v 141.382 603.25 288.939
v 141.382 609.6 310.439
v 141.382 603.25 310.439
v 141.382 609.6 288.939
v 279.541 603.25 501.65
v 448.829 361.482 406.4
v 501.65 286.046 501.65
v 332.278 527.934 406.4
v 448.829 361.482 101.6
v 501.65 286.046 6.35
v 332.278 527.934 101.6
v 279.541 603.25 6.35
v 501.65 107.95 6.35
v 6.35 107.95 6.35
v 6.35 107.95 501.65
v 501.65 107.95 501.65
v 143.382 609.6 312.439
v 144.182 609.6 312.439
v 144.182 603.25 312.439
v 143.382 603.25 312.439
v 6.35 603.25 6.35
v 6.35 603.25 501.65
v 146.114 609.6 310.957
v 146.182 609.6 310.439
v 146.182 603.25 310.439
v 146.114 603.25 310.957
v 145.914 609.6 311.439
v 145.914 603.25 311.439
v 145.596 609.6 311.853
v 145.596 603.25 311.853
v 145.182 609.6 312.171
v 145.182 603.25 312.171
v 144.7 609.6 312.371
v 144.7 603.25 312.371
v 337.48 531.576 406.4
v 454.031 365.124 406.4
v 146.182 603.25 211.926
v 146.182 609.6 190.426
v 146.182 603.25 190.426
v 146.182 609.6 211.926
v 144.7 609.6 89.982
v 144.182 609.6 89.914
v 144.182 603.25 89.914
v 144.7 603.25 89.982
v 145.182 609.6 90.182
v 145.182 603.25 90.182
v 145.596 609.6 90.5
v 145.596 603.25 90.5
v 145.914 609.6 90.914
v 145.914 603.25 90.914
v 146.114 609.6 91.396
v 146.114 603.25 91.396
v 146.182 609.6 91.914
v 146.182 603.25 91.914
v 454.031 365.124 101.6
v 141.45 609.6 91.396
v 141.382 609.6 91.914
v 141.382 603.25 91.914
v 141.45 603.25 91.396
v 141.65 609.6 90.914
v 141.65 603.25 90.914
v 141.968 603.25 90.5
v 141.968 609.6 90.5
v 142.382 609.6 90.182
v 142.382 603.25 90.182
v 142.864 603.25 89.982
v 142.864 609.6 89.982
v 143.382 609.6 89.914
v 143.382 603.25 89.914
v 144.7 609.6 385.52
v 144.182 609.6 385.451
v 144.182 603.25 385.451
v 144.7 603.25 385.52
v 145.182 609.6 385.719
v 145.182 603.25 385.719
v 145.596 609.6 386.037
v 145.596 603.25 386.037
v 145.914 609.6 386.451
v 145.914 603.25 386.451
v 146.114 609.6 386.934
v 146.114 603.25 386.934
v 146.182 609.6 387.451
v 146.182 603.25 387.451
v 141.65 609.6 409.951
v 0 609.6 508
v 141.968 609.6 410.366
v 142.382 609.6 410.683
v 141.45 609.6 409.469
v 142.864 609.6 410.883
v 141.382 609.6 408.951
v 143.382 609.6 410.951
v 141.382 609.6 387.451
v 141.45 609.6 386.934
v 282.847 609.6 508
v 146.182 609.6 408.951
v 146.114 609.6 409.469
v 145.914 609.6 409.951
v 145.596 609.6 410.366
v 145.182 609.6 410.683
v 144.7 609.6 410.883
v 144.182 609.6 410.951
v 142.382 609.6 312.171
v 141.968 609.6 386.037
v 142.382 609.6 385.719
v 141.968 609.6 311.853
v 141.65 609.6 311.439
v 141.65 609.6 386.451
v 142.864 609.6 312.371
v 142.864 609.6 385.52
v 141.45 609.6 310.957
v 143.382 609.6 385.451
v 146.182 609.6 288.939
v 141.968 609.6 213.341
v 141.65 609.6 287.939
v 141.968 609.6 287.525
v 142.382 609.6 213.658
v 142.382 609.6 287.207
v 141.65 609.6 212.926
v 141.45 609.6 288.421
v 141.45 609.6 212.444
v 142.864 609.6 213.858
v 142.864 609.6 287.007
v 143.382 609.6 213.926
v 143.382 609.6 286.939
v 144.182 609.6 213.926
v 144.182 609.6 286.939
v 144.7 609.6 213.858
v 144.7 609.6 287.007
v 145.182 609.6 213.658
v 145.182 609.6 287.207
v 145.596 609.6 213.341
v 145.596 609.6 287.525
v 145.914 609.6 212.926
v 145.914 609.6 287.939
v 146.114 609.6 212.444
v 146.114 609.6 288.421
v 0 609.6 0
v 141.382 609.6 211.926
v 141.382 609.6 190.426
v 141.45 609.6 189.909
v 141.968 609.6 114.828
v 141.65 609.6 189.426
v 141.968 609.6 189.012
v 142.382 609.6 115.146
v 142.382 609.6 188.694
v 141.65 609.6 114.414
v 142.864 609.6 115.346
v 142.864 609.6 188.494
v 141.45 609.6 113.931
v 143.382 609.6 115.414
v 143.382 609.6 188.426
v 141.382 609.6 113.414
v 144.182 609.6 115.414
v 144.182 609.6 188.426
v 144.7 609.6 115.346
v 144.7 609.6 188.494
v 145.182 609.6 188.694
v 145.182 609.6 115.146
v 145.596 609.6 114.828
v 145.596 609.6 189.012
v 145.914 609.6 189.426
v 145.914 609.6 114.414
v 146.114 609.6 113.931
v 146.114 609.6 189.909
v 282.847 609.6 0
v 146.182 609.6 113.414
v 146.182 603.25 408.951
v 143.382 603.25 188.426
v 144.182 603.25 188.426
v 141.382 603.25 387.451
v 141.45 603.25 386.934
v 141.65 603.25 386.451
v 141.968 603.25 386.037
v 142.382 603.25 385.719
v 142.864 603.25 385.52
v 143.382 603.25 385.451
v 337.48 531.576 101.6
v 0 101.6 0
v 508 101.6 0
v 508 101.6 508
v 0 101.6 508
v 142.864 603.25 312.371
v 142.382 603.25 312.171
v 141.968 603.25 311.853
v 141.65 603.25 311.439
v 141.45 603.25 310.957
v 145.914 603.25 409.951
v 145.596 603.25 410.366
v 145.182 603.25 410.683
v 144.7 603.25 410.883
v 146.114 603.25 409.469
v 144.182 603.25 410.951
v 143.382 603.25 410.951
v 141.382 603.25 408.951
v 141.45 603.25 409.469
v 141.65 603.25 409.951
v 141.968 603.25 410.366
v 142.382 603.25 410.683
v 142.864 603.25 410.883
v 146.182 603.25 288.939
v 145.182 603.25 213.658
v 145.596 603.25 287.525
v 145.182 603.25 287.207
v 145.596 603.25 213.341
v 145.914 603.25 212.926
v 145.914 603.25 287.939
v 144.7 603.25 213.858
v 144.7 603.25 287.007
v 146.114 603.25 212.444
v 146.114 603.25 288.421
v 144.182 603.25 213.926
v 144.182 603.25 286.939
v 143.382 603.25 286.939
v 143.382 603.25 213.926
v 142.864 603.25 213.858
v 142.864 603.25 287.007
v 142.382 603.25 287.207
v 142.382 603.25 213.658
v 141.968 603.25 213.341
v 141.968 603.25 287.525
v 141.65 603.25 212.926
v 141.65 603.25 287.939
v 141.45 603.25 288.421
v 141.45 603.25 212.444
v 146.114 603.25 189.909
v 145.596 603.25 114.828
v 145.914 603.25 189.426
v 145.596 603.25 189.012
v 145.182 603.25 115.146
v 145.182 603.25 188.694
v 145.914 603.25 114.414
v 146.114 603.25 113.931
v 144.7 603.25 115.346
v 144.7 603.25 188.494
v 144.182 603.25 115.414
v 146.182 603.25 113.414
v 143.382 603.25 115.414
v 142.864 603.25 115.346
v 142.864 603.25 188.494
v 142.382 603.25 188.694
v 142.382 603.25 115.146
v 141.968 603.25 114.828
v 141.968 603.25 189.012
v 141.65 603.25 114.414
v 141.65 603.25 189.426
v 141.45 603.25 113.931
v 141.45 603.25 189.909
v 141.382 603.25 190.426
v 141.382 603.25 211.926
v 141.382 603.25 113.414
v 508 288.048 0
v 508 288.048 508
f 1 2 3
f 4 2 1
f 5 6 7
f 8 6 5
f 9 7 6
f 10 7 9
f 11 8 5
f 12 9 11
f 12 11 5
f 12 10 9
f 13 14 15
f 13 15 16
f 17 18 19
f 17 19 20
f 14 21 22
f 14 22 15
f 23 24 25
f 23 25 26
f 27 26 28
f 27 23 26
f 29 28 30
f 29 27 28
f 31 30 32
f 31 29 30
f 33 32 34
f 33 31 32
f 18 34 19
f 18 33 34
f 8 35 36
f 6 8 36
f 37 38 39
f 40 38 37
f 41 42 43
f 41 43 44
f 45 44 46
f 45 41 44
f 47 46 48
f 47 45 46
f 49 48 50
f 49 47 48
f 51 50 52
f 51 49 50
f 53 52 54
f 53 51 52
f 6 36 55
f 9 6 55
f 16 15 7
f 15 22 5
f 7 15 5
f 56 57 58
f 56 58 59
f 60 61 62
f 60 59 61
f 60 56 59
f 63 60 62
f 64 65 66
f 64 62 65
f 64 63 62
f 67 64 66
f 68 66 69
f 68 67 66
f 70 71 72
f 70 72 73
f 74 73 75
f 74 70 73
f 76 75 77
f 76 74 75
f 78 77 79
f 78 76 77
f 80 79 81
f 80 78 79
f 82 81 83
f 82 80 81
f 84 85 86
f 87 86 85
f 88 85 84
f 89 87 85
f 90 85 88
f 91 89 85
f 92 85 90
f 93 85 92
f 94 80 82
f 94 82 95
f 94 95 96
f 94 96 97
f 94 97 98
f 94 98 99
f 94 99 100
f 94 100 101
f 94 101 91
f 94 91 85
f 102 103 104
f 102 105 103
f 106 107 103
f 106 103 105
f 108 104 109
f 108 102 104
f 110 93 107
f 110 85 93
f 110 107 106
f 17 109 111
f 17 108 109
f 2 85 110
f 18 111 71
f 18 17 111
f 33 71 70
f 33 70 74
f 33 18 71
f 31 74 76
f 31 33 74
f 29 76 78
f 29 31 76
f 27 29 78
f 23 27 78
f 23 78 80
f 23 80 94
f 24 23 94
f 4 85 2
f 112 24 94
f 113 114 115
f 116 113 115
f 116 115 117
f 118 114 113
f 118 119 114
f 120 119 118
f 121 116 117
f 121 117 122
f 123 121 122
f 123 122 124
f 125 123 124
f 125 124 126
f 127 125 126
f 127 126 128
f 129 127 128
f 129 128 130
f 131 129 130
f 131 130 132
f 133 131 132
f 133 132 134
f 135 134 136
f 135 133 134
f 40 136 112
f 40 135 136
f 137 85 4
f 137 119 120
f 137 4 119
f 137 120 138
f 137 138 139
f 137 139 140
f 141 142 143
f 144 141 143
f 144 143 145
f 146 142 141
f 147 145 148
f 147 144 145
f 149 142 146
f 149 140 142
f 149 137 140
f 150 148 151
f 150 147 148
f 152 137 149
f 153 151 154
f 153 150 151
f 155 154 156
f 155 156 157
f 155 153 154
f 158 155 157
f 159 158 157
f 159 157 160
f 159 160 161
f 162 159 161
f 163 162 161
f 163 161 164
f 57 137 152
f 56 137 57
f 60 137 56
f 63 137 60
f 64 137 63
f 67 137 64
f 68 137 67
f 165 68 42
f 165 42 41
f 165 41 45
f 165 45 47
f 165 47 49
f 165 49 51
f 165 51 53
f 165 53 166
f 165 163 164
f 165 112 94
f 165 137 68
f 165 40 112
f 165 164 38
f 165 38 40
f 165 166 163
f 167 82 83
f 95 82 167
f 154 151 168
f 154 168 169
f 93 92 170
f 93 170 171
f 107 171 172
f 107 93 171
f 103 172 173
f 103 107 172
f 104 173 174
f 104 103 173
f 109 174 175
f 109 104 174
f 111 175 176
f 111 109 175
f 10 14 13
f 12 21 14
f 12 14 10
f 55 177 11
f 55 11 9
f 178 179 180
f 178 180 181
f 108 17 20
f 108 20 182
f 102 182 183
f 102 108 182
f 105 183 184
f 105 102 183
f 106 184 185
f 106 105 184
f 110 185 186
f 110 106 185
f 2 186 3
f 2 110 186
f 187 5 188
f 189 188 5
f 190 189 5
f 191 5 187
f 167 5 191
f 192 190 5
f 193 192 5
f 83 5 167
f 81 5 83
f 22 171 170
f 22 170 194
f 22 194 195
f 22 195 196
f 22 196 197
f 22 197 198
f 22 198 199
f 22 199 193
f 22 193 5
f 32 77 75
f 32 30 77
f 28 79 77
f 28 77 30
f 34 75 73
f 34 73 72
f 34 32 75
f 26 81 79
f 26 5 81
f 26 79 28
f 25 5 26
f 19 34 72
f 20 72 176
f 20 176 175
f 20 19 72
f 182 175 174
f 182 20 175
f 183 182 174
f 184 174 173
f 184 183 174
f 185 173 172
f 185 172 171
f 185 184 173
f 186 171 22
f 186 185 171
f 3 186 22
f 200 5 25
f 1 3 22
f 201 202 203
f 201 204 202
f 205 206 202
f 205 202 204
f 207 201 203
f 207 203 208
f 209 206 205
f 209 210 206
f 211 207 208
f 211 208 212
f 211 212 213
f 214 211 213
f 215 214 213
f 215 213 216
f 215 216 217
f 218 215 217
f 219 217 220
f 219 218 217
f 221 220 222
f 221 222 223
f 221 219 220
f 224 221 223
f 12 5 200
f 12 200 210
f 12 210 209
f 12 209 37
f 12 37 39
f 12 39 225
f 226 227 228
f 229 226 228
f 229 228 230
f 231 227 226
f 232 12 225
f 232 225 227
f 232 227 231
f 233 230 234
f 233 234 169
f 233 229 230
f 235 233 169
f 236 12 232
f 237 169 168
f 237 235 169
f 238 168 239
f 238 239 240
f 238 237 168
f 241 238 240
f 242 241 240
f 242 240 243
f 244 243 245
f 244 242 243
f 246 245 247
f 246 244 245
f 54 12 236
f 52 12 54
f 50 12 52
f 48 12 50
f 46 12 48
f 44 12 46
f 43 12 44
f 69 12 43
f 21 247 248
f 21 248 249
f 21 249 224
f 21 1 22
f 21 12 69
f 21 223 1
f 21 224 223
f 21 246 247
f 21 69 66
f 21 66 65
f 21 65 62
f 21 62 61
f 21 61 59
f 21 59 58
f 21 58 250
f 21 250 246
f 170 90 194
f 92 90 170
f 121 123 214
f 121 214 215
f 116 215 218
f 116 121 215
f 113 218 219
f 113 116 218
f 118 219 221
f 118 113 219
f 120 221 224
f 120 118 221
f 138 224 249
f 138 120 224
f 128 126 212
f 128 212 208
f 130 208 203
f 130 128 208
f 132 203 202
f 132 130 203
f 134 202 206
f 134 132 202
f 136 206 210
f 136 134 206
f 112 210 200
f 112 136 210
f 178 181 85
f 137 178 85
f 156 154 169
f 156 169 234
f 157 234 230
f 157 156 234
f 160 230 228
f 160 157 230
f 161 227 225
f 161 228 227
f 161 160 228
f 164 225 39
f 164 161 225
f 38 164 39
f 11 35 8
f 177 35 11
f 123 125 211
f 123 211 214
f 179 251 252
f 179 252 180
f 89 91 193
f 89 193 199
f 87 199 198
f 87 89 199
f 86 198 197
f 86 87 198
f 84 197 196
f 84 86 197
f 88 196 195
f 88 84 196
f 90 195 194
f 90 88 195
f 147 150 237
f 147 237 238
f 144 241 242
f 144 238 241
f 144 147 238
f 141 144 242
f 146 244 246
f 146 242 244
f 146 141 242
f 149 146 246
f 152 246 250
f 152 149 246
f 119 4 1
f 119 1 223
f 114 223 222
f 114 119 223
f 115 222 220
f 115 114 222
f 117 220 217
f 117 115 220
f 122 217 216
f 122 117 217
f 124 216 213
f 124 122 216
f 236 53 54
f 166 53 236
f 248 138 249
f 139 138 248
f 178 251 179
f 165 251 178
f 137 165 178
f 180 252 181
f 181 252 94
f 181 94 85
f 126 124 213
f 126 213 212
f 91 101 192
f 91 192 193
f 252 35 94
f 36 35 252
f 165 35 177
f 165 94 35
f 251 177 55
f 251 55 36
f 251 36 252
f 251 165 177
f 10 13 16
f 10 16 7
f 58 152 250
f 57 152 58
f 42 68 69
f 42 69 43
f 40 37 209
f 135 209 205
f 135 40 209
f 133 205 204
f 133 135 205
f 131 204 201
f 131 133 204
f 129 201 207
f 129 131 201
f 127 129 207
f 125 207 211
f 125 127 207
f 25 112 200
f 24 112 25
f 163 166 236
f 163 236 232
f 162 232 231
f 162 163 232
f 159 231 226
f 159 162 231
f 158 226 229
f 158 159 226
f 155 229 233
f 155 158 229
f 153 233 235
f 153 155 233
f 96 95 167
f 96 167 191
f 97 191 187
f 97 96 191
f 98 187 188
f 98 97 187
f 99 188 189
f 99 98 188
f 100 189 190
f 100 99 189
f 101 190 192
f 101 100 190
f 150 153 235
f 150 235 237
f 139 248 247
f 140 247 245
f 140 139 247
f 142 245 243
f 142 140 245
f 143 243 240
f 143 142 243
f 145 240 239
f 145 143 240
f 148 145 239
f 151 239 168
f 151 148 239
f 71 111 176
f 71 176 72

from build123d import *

# Parameters (mm, degrees)
BOSS_EXTRUDE1_DEPTH = 508
SKETCH3_W           = 304.8
SKETCH3_H           = 203.2
CUT_EXTRUDE3_DEPTH  = 6.35
SHELL2_START        = 6.35
SHELL2_DEPTH        = 495.3
CUT_EXTRUDE5_REACH  = 881.882


# Read off the part's stored shape, not the designer's step: Shell2
with BuildPart() as part:
    # Sketch1 → Boss-Extrude1 (new body)
    with BuildSketch(Plane.XY):
        Polygon((0, 101.6), (0, 609.6), (282.846955047, 609.6), (508, 288.048127639), (508, 101.6), align=None)
    extrude(amount=BOSS_EXTRUDE1_DEPTH)

    # Sketch3 → Cut-Extrude3 (cut)
    with BuildSketch(Plane(origin=(-2211.042315979, 4171.242991451, 0), x_dir=(0, 0, -1), z_dir=(-0.8191520442889911, -0.573576436351047, 0))):
        with Locations((-254, 4544.813258204)):
            Rectangle(SKETCH3_W, SKETCH3_H)
    extrude(amount=CUT_EXTRUDE3_DEPTH, mode=Mode.SUBTRACT)

    # Shell2 outline → Shell2 (cut)
    with BuildSketch(Plane.XY.offset(SHELL2_START)):
        Polygon((501.65, 107.95), (501.65, 286.045980329), (279.541354276, 603.25), (6.35, 603.25), (6.35, 107.95), align=None)
    extrude(amount=SHELL2_DEPTH, mode=Mode.SUBTRACT)

    # Sketch10 → Cut-Extrude5 (cut, up to next)
    with BuildSketch(Plane(origin=(0, 609.6, 0), x_dir=(1, 0, 0), z_dir=(0, 1, 0)), mode=Mode.PRIVATE) as cut_extrude5_sk1:
        with BuildLine():
            Line((143.381985017, -385.451435914), (144.181985017, -385.451435914))
            ThreePointArc((144.181985017, -385.451435914), (145.596198579, -386.037222352), (146.181985017, -387.451435914))
            Line((146.181985017, -387.451435914), (146.181985017, -408.951435914))
            ThreePointArc((146.181985017, -408.951435914), (145.596198579, -410.365649476), (144.181985017, -410.951435914))
            Line((144.181985017, -410.951435914), (143.381985017, -410.951435914))
            ThreePointArc((143.381985017, -410.951435914), (141.967771454, -410.365649476), (141.381985017, -408.951435914))
            Line((141.381985017, -408.951435914), (141.381985017, -387.451435914))
            ThreePointArc((141.381985017, -387.451435914), (141.967771454, -386.037222352), (143.381985017, -385.451435914))
        make_face()
    cut_extrude5_tool1 = extrude(cut_extrude5_sk1.sketch, amount=-CUT_EXTRUDE5_REACH, mode=Mode.PRIVATE) & part.part
    # Sketch10 → Cut-Extrude5 (cut, up to next)
    with BuildSketch(Plane(origin=(0, 609.6, 0), x_dir=(1, 0, 0), z_dir=(0, 1, 0)), mode=Mode.PRIVATE) as cut_extrude5_sk2:
        with BuildLine():
            Line((144.181985017, -312.438871317), (143.381985017, -312.438871317))
            ThreePointArc((143.381985017, -312.438871317), (141.967771454, -311.853084879), (141.381985017, -310.438871317))
            Line((141.381985017, -310.438871317), (141.381985017, -288.938871317))
            ThreePointArc((141.381985017, -288.938871317), (141.967771454, -287.524657755), (143.381985017, -286.938871317))
            Line((143.381985017, -286.938871317), (144.181985017, -286.938871317))
            ThreePointArc((144.181985017, -286.938871317), (145.596198579, -287.524657755), (146.181985017, -288.938871317))
            Line((146.181985017, -288.938871317), (146.181985017, -310.438871317))
            ThreePointArc((146.181985017, -310.438871317), (145.596198579, -311.853084879), (144.181985017, -312.438871317))
        make_face()
    cut_extrude5_tool2 = extrude(cut_extrude5_sk2.sketch, amount=-CUT_EXTRUDE5_REACH, mode=Mode.PRIVATE) & part.part
    # Sketch10 → Cut-Extrude5 (cut, up to next)
    with BuildSketch(Plane(origin=(0, 609.6, 0), x_dir=(1, 0, 0), z_dir=(0, 1, 0)), mode=Mode.PRIVATE) as cut_extrude5_sk3:
        with BuildLine():
            Line((144.181985017, -213.92630672), (143.381985017, -213.92630672))
            ThreePointArc((143.381985017, -213.92630672), (141.967771454, -213.340520282), (141.381985017, -211.92630672))
            Line((141.381985017, -211.92630672), (141.381985017, -190.42630672))
            ThreePointArc((141.381985017, -190.42630672), (141.967771454, -189.012093158), (143.381985017, -188.42630672))
            Line((143.381985017, -188.42630672), (144.181985017, -188.42630672))
            ThreePointArc((144.181985017, -188.42630672), (145.596198579, -189.012093158), (146.181985017, -190.42630672))
            Line((146.181985017, -190.42630672), (146.181985017, -211.92630672))
            ThreePointArc((146.181985017, -211.92630672), (145.596198579, -213.340520282), (144.181985017, -213.92630672))
        make_face()
    cut_extrude5_tool3 = extrude(cut_extrude5_sk3.sketch, amount=-CUT_EXTRUDE5_REACH, mode=Mode.PRIVATE) & part.part
    # Sketch10 → Cut-Extrude5 (cut, up to next)
    with BuildSketch(Plane(origin=(0, 609.6, 0), x_dir=(1, 0, 0), z_dir=(0, 1, 0)), mode=Mode.PRIVATE) as cut_extrude5_sk4:
        with BuildLine():
            Line((144.181985017, -115.413742123), (143.381985017, -115.413742123))
            ThreePointArc((143.381985017, -115.413742123), (141.967771454, -114.827955685), (141.381985017, -113.413742123))
            Line((141.381985017, -113.413742123), (141.381985017, -91.913742123))
            ThreePointArc((141.381985017, -91.913742123), (141.967771454, -90.499528561), (143.381985017, -89.913742123))
            Line((143.381985017, -89.913742123), (144.181985017, -89.913742123))
            ThreePointArc((144.181985017, -89.913742123), (145.596198579, -90.499528561), (146.181985017, -91.913742123))
            Line((146.181985017, -91.913742123), (146.181985017, -113.413742123))
            ThreePointArc((146.181985017, -113.413742123), (145.596198579, -114.827955685), (144.181985017, -115.413742123))
        make_face()
    cut_extrude5_tool4 = extrude(cut_extrude5_sk4.sketch, amount=-CUT_EXTRUDE5_REACH, mode=Mode.PRIVATE) & part.part
    add(cut_extrude5_tool1.solids().sort_by_distance((143.781985, 609.6, 398.201436))[0], mode=Mode.SUBTRACT)
    add(cut_extrude5_tool2.solids().sort_by_distance((143.781985, 609.6, 299.688871))[0], mode=Mode.SUBTRACT)
    add(cut_extrude5_tool3.solids().sort_by_distance((143.781985, 609.6, 201.176307))[0], mode=Mode.SUBTRACT)
    add(cut_extrude5_tool4.solids().sort_by_distance((143.781985, 609.6, 102.663742))[0], mode=Mode.SUBTRACT)


solid = part.part
